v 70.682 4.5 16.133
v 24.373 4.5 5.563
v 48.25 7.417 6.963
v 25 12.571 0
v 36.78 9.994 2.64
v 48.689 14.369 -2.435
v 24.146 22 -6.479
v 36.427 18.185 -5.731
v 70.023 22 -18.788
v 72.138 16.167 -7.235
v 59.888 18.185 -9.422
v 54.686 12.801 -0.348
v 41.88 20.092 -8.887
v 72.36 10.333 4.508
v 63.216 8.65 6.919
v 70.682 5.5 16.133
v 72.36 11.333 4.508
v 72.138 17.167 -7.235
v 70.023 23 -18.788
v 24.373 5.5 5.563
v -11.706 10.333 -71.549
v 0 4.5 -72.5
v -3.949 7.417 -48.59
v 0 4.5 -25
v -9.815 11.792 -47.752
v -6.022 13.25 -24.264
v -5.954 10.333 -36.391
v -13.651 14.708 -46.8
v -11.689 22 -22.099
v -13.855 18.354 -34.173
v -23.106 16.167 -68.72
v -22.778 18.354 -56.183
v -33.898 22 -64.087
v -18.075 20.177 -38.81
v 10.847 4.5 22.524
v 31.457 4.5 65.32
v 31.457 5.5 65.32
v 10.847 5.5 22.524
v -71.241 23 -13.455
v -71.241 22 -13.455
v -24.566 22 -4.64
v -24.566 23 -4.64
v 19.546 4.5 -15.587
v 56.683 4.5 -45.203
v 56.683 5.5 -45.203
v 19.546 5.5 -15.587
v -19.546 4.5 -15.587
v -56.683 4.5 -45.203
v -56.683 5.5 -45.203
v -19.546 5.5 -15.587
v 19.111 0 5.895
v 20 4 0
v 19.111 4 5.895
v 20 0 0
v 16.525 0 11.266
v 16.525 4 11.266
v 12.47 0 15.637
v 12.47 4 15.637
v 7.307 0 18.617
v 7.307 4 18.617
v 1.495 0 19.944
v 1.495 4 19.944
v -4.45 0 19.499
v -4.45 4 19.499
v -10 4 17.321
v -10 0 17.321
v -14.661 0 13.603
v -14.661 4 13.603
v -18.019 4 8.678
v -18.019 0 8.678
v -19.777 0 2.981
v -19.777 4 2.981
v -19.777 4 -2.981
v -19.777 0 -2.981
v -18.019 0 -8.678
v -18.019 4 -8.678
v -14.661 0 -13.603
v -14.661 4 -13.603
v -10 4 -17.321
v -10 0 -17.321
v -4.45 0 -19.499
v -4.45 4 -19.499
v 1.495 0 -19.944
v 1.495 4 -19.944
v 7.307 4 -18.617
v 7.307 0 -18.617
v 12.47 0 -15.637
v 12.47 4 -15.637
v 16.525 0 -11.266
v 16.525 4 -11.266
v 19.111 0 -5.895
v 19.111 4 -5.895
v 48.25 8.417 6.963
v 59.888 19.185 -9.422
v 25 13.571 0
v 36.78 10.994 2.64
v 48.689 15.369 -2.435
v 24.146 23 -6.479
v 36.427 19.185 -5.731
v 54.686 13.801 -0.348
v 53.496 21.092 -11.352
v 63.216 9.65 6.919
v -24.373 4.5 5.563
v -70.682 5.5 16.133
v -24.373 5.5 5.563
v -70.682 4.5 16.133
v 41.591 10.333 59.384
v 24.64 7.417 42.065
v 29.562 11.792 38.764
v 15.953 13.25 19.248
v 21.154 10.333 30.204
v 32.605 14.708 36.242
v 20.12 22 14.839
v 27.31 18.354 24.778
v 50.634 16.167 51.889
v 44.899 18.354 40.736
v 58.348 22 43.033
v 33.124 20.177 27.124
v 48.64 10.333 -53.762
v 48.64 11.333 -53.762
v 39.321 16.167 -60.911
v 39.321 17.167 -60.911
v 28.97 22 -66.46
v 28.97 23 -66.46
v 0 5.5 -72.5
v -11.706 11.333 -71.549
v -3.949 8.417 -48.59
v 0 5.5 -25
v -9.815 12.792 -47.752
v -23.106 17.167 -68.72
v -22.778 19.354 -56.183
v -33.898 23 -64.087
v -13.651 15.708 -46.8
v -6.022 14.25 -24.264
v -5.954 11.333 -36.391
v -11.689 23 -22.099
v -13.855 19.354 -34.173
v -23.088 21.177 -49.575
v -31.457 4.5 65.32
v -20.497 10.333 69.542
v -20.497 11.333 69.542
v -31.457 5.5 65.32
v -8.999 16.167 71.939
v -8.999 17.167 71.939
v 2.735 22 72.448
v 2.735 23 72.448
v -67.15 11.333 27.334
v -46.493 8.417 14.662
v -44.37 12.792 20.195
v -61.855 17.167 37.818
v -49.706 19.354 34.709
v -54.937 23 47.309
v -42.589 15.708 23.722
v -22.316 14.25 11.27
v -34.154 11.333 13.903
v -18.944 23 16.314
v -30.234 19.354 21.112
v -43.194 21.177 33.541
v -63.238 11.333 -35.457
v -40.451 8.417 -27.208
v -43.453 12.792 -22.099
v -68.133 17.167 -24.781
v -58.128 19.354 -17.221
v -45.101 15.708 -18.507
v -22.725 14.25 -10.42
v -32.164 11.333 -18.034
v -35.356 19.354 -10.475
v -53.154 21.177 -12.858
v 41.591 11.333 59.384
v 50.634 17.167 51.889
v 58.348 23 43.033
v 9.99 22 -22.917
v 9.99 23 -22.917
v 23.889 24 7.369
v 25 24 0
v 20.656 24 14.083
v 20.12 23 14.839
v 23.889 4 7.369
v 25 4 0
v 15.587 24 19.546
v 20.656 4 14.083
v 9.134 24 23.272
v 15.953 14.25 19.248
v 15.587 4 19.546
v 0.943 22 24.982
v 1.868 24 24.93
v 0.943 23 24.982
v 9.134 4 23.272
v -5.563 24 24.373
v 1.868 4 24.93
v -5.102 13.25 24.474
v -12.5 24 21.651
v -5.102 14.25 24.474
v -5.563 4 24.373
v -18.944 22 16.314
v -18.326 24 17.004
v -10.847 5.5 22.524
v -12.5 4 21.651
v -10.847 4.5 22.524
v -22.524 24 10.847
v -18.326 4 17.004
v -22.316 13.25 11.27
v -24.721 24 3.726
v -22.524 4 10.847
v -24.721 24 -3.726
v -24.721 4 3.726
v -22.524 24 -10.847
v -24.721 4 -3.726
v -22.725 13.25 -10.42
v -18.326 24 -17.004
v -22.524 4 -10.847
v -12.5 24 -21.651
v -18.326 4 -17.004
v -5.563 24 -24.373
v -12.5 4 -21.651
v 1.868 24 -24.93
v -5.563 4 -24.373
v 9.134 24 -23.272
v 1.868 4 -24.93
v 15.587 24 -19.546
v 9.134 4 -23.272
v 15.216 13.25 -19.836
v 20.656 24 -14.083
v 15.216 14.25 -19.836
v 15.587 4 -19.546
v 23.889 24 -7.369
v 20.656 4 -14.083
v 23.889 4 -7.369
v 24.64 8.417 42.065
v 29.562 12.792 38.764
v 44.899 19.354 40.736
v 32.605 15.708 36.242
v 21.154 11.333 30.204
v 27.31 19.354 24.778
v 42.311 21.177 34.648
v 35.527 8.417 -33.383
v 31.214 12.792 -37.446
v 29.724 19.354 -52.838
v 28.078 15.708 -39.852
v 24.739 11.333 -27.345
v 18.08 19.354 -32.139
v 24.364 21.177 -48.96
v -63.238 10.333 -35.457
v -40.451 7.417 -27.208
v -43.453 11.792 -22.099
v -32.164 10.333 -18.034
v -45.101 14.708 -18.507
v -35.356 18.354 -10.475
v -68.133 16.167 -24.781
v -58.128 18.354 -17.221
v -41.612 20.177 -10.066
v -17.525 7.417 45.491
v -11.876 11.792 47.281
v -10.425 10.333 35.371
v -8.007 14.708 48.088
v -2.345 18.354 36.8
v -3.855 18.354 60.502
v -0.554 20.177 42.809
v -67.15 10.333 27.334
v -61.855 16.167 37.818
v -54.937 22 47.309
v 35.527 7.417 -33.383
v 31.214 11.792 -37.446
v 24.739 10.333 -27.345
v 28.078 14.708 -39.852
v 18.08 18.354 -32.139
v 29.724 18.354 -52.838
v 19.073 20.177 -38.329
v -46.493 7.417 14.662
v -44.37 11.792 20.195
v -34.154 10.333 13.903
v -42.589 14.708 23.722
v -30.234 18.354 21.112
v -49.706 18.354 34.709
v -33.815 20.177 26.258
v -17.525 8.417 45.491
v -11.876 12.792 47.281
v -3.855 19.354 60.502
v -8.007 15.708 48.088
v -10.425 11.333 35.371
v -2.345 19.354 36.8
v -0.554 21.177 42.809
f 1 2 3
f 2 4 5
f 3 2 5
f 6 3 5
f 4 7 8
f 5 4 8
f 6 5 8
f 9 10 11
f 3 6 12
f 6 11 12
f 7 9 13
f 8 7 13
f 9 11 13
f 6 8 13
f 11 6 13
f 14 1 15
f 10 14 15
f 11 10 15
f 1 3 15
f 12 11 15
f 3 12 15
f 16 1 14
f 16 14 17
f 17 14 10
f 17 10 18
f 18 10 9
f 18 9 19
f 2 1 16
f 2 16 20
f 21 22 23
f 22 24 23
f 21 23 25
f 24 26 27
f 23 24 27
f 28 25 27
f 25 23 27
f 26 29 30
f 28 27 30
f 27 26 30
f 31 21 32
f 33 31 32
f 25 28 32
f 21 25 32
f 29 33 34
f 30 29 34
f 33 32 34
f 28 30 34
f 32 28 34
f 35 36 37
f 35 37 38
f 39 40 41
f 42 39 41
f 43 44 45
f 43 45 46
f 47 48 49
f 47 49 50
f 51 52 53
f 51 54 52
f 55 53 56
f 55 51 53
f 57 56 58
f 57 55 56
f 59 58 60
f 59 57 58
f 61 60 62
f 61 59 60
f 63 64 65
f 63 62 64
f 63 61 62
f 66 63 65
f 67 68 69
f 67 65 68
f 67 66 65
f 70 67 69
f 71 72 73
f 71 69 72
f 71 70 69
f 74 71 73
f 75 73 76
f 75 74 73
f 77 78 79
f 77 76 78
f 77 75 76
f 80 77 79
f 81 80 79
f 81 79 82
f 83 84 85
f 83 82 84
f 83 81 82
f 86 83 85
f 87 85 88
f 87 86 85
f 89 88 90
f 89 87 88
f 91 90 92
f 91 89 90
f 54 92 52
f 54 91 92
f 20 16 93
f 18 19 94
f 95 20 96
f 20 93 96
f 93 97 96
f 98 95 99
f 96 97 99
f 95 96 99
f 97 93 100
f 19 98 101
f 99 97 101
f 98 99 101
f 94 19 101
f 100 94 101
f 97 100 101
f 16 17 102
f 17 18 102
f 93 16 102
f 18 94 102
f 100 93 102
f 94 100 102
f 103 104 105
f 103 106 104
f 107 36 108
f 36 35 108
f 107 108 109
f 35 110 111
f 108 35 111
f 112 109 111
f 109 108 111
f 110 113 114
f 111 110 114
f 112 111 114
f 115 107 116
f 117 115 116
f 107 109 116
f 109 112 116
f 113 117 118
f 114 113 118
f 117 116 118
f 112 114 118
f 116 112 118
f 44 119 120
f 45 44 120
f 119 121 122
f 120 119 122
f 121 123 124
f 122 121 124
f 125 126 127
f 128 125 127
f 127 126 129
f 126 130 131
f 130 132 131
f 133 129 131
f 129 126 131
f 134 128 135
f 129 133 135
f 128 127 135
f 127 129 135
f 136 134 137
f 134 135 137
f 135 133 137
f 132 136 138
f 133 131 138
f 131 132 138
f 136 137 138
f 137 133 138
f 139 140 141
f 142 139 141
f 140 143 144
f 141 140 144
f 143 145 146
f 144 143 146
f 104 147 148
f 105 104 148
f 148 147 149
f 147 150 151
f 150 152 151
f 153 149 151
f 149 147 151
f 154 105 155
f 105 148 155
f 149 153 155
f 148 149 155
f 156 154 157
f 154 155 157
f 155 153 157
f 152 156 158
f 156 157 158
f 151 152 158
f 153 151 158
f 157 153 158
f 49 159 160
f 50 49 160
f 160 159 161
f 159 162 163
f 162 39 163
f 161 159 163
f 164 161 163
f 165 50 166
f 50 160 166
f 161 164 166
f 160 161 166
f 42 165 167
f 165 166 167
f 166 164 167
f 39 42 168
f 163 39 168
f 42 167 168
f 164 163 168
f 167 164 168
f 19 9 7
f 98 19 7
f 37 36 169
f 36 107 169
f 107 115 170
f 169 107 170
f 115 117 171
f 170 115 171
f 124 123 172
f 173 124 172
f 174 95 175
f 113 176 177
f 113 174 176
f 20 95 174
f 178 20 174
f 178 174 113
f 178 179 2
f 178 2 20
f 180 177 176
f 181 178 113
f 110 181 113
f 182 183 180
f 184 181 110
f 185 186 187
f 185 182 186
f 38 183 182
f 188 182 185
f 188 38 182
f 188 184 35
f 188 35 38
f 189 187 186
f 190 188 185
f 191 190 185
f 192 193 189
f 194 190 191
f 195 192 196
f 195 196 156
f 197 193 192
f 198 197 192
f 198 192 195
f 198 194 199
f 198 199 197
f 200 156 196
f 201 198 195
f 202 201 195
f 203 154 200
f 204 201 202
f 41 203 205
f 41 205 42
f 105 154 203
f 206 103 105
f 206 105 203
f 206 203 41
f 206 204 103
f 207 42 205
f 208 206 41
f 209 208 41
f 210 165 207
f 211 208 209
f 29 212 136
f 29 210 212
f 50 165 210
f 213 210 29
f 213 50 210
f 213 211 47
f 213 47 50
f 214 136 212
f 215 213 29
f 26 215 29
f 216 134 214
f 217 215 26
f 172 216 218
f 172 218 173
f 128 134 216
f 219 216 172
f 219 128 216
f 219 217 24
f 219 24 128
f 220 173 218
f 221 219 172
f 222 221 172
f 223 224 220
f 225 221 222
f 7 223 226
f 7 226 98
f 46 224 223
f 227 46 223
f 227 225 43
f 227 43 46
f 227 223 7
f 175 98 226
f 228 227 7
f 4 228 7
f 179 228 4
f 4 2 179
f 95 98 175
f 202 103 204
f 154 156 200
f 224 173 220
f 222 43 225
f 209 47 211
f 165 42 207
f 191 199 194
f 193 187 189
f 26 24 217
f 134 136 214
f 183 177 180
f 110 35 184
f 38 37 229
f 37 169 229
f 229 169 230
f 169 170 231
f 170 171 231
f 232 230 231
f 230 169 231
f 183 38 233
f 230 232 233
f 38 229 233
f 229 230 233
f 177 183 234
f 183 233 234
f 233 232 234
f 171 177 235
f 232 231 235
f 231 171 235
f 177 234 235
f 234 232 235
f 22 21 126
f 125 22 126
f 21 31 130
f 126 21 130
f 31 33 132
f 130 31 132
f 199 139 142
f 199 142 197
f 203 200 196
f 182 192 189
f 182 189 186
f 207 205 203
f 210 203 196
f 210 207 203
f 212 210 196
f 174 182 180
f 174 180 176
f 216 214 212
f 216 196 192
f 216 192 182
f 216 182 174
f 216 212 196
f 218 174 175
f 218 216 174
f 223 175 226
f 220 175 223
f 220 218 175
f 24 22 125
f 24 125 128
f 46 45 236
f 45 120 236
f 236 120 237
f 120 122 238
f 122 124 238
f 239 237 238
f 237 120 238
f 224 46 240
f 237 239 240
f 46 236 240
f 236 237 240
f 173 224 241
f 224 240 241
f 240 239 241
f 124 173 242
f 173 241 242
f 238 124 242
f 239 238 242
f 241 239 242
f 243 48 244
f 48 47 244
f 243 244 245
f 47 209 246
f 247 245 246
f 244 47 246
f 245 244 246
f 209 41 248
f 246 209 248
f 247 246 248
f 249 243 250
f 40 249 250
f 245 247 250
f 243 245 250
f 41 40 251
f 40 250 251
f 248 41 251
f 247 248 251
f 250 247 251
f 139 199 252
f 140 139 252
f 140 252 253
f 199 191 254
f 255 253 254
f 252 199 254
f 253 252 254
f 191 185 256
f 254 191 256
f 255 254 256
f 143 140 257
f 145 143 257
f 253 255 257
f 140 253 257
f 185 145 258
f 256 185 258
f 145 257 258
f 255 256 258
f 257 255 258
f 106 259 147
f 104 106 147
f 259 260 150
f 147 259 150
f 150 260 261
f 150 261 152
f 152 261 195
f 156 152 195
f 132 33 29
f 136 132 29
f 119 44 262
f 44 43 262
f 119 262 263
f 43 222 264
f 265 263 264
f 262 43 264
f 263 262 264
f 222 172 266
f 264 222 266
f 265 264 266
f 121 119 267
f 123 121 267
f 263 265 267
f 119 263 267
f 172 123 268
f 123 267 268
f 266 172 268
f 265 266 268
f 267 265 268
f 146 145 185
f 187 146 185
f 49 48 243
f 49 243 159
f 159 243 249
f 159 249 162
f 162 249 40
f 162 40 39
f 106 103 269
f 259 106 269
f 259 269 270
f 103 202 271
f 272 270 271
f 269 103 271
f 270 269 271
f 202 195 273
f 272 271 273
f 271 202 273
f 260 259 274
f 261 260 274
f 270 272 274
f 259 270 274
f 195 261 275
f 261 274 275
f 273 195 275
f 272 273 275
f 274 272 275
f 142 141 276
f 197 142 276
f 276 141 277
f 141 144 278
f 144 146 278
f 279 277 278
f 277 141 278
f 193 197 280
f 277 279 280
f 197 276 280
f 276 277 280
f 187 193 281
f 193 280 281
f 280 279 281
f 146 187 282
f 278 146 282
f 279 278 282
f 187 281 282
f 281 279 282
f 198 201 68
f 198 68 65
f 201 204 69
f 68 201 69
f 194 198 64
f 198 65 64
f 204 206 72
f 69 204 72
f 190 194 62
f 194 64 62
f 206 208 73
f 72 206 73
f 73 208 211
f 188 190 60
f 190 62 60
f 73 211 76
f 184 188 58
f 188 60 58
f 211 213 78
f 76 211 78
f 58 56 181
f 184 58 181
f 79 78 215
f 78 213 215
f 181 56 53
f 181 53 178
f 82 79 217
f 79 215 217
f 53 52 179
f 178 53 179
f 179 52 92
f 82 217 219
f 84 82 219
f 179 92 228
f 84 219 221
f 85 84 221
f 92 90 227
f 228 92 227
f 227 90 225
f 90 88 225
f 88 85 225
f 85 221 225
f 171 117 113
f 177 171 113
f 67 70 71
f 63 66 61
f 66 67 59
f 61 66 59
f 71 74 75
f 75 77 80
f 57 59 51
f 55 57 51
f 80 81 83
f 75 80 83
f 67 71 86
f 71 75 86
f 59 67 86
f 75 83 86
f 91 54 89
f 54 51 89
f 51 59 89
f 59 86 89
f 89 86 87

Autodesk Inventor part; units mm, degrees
ref_plane "YZ Plane" through (0, 0, 0) normal (1, 0, 0) x (0, 1, 0)
ref_plane "XZ Plane" through (0, 0, 0) normal (0, 1, 0) x (-1, 0, 0)
ref_plane "XY Plane" through (0, 0, 0) normal (0, 0, 1) x (1, 0, 0)
sketch "Sketch1" plane through (0, 0, 0) normal (0, 0, 1) x (1, 0, 0)
  line L0 (0, 0) -> (0, 24)
  line L1 (0, 24) -> (25, 24)
  line L2 (25, 24) -> (25, 4)
  line L3 (25, 4) -> (20, 4)
  line L4 (20, 4) -> (20, 0)
  line L5 (20, 0) -> (0, 0)
  line L6 (0, -4.8611) -> (0, 32.7303) construction
  dimension "d0" = 25
  dimension "d1" = 20
  dimension "d2" = 4
  dimension "d4" = 5
revolve "Revolution1" add sketch "Sketch1" angle 360 about axis through (0, -4.8611, 0) along (0, 1, 0)
sketch "Sketch9" plane through (0, 0, 0) normal (1, 0, 0) x (0, 1, 0)
  line L0 (0, 0) -> (-39.5663, 0) construction
  line L1 (4.5, -25) -> (5.5, -25)
  line L2 (5.5, -25) -> (5.5, -72.5)
  line L3 (5.5, -72.5) -> (4.5, -72.5)
  line L4 (4.5, -72.5) -> (4.5, -25)
  line L5 (0, -20) -> (0, 20) projected
  dimension "d28" = 1
  dimension "d29" = 25
  dimension "d30" = 4.5
  dimension "d31" = 47.5
coil "Coil1" sketch "Sketch9" operation add axis through (0, 0, 0) along (0, 1, 0) pitch 226 turns 0.077434 hand right
pattern_circular "Circular Pattern1" count 7 over 360 about axis through (0, 14, 0) along (0, 1, 0) of "Coil1"
equation "\"BendRadius\" = Thickness"
equation "\"BendReliefWidth\" = Thickness"
equation "\"BendReliefDepth\" = 0.5 * Thickness"
equation "\"CornerReliefSize\" = 4 * Thickness"
equation "\"MinimumRemnant\" = 2 * Thickness"
equation "\"TransitionRadius\" = BendRadius"
equation "\"JacobiRadiusSize\" = BendRadius"
equation "\"GapSize\" = Thickness"
equation "\"Thickness\" = 0.5"
properties part number "Ventoinha"
